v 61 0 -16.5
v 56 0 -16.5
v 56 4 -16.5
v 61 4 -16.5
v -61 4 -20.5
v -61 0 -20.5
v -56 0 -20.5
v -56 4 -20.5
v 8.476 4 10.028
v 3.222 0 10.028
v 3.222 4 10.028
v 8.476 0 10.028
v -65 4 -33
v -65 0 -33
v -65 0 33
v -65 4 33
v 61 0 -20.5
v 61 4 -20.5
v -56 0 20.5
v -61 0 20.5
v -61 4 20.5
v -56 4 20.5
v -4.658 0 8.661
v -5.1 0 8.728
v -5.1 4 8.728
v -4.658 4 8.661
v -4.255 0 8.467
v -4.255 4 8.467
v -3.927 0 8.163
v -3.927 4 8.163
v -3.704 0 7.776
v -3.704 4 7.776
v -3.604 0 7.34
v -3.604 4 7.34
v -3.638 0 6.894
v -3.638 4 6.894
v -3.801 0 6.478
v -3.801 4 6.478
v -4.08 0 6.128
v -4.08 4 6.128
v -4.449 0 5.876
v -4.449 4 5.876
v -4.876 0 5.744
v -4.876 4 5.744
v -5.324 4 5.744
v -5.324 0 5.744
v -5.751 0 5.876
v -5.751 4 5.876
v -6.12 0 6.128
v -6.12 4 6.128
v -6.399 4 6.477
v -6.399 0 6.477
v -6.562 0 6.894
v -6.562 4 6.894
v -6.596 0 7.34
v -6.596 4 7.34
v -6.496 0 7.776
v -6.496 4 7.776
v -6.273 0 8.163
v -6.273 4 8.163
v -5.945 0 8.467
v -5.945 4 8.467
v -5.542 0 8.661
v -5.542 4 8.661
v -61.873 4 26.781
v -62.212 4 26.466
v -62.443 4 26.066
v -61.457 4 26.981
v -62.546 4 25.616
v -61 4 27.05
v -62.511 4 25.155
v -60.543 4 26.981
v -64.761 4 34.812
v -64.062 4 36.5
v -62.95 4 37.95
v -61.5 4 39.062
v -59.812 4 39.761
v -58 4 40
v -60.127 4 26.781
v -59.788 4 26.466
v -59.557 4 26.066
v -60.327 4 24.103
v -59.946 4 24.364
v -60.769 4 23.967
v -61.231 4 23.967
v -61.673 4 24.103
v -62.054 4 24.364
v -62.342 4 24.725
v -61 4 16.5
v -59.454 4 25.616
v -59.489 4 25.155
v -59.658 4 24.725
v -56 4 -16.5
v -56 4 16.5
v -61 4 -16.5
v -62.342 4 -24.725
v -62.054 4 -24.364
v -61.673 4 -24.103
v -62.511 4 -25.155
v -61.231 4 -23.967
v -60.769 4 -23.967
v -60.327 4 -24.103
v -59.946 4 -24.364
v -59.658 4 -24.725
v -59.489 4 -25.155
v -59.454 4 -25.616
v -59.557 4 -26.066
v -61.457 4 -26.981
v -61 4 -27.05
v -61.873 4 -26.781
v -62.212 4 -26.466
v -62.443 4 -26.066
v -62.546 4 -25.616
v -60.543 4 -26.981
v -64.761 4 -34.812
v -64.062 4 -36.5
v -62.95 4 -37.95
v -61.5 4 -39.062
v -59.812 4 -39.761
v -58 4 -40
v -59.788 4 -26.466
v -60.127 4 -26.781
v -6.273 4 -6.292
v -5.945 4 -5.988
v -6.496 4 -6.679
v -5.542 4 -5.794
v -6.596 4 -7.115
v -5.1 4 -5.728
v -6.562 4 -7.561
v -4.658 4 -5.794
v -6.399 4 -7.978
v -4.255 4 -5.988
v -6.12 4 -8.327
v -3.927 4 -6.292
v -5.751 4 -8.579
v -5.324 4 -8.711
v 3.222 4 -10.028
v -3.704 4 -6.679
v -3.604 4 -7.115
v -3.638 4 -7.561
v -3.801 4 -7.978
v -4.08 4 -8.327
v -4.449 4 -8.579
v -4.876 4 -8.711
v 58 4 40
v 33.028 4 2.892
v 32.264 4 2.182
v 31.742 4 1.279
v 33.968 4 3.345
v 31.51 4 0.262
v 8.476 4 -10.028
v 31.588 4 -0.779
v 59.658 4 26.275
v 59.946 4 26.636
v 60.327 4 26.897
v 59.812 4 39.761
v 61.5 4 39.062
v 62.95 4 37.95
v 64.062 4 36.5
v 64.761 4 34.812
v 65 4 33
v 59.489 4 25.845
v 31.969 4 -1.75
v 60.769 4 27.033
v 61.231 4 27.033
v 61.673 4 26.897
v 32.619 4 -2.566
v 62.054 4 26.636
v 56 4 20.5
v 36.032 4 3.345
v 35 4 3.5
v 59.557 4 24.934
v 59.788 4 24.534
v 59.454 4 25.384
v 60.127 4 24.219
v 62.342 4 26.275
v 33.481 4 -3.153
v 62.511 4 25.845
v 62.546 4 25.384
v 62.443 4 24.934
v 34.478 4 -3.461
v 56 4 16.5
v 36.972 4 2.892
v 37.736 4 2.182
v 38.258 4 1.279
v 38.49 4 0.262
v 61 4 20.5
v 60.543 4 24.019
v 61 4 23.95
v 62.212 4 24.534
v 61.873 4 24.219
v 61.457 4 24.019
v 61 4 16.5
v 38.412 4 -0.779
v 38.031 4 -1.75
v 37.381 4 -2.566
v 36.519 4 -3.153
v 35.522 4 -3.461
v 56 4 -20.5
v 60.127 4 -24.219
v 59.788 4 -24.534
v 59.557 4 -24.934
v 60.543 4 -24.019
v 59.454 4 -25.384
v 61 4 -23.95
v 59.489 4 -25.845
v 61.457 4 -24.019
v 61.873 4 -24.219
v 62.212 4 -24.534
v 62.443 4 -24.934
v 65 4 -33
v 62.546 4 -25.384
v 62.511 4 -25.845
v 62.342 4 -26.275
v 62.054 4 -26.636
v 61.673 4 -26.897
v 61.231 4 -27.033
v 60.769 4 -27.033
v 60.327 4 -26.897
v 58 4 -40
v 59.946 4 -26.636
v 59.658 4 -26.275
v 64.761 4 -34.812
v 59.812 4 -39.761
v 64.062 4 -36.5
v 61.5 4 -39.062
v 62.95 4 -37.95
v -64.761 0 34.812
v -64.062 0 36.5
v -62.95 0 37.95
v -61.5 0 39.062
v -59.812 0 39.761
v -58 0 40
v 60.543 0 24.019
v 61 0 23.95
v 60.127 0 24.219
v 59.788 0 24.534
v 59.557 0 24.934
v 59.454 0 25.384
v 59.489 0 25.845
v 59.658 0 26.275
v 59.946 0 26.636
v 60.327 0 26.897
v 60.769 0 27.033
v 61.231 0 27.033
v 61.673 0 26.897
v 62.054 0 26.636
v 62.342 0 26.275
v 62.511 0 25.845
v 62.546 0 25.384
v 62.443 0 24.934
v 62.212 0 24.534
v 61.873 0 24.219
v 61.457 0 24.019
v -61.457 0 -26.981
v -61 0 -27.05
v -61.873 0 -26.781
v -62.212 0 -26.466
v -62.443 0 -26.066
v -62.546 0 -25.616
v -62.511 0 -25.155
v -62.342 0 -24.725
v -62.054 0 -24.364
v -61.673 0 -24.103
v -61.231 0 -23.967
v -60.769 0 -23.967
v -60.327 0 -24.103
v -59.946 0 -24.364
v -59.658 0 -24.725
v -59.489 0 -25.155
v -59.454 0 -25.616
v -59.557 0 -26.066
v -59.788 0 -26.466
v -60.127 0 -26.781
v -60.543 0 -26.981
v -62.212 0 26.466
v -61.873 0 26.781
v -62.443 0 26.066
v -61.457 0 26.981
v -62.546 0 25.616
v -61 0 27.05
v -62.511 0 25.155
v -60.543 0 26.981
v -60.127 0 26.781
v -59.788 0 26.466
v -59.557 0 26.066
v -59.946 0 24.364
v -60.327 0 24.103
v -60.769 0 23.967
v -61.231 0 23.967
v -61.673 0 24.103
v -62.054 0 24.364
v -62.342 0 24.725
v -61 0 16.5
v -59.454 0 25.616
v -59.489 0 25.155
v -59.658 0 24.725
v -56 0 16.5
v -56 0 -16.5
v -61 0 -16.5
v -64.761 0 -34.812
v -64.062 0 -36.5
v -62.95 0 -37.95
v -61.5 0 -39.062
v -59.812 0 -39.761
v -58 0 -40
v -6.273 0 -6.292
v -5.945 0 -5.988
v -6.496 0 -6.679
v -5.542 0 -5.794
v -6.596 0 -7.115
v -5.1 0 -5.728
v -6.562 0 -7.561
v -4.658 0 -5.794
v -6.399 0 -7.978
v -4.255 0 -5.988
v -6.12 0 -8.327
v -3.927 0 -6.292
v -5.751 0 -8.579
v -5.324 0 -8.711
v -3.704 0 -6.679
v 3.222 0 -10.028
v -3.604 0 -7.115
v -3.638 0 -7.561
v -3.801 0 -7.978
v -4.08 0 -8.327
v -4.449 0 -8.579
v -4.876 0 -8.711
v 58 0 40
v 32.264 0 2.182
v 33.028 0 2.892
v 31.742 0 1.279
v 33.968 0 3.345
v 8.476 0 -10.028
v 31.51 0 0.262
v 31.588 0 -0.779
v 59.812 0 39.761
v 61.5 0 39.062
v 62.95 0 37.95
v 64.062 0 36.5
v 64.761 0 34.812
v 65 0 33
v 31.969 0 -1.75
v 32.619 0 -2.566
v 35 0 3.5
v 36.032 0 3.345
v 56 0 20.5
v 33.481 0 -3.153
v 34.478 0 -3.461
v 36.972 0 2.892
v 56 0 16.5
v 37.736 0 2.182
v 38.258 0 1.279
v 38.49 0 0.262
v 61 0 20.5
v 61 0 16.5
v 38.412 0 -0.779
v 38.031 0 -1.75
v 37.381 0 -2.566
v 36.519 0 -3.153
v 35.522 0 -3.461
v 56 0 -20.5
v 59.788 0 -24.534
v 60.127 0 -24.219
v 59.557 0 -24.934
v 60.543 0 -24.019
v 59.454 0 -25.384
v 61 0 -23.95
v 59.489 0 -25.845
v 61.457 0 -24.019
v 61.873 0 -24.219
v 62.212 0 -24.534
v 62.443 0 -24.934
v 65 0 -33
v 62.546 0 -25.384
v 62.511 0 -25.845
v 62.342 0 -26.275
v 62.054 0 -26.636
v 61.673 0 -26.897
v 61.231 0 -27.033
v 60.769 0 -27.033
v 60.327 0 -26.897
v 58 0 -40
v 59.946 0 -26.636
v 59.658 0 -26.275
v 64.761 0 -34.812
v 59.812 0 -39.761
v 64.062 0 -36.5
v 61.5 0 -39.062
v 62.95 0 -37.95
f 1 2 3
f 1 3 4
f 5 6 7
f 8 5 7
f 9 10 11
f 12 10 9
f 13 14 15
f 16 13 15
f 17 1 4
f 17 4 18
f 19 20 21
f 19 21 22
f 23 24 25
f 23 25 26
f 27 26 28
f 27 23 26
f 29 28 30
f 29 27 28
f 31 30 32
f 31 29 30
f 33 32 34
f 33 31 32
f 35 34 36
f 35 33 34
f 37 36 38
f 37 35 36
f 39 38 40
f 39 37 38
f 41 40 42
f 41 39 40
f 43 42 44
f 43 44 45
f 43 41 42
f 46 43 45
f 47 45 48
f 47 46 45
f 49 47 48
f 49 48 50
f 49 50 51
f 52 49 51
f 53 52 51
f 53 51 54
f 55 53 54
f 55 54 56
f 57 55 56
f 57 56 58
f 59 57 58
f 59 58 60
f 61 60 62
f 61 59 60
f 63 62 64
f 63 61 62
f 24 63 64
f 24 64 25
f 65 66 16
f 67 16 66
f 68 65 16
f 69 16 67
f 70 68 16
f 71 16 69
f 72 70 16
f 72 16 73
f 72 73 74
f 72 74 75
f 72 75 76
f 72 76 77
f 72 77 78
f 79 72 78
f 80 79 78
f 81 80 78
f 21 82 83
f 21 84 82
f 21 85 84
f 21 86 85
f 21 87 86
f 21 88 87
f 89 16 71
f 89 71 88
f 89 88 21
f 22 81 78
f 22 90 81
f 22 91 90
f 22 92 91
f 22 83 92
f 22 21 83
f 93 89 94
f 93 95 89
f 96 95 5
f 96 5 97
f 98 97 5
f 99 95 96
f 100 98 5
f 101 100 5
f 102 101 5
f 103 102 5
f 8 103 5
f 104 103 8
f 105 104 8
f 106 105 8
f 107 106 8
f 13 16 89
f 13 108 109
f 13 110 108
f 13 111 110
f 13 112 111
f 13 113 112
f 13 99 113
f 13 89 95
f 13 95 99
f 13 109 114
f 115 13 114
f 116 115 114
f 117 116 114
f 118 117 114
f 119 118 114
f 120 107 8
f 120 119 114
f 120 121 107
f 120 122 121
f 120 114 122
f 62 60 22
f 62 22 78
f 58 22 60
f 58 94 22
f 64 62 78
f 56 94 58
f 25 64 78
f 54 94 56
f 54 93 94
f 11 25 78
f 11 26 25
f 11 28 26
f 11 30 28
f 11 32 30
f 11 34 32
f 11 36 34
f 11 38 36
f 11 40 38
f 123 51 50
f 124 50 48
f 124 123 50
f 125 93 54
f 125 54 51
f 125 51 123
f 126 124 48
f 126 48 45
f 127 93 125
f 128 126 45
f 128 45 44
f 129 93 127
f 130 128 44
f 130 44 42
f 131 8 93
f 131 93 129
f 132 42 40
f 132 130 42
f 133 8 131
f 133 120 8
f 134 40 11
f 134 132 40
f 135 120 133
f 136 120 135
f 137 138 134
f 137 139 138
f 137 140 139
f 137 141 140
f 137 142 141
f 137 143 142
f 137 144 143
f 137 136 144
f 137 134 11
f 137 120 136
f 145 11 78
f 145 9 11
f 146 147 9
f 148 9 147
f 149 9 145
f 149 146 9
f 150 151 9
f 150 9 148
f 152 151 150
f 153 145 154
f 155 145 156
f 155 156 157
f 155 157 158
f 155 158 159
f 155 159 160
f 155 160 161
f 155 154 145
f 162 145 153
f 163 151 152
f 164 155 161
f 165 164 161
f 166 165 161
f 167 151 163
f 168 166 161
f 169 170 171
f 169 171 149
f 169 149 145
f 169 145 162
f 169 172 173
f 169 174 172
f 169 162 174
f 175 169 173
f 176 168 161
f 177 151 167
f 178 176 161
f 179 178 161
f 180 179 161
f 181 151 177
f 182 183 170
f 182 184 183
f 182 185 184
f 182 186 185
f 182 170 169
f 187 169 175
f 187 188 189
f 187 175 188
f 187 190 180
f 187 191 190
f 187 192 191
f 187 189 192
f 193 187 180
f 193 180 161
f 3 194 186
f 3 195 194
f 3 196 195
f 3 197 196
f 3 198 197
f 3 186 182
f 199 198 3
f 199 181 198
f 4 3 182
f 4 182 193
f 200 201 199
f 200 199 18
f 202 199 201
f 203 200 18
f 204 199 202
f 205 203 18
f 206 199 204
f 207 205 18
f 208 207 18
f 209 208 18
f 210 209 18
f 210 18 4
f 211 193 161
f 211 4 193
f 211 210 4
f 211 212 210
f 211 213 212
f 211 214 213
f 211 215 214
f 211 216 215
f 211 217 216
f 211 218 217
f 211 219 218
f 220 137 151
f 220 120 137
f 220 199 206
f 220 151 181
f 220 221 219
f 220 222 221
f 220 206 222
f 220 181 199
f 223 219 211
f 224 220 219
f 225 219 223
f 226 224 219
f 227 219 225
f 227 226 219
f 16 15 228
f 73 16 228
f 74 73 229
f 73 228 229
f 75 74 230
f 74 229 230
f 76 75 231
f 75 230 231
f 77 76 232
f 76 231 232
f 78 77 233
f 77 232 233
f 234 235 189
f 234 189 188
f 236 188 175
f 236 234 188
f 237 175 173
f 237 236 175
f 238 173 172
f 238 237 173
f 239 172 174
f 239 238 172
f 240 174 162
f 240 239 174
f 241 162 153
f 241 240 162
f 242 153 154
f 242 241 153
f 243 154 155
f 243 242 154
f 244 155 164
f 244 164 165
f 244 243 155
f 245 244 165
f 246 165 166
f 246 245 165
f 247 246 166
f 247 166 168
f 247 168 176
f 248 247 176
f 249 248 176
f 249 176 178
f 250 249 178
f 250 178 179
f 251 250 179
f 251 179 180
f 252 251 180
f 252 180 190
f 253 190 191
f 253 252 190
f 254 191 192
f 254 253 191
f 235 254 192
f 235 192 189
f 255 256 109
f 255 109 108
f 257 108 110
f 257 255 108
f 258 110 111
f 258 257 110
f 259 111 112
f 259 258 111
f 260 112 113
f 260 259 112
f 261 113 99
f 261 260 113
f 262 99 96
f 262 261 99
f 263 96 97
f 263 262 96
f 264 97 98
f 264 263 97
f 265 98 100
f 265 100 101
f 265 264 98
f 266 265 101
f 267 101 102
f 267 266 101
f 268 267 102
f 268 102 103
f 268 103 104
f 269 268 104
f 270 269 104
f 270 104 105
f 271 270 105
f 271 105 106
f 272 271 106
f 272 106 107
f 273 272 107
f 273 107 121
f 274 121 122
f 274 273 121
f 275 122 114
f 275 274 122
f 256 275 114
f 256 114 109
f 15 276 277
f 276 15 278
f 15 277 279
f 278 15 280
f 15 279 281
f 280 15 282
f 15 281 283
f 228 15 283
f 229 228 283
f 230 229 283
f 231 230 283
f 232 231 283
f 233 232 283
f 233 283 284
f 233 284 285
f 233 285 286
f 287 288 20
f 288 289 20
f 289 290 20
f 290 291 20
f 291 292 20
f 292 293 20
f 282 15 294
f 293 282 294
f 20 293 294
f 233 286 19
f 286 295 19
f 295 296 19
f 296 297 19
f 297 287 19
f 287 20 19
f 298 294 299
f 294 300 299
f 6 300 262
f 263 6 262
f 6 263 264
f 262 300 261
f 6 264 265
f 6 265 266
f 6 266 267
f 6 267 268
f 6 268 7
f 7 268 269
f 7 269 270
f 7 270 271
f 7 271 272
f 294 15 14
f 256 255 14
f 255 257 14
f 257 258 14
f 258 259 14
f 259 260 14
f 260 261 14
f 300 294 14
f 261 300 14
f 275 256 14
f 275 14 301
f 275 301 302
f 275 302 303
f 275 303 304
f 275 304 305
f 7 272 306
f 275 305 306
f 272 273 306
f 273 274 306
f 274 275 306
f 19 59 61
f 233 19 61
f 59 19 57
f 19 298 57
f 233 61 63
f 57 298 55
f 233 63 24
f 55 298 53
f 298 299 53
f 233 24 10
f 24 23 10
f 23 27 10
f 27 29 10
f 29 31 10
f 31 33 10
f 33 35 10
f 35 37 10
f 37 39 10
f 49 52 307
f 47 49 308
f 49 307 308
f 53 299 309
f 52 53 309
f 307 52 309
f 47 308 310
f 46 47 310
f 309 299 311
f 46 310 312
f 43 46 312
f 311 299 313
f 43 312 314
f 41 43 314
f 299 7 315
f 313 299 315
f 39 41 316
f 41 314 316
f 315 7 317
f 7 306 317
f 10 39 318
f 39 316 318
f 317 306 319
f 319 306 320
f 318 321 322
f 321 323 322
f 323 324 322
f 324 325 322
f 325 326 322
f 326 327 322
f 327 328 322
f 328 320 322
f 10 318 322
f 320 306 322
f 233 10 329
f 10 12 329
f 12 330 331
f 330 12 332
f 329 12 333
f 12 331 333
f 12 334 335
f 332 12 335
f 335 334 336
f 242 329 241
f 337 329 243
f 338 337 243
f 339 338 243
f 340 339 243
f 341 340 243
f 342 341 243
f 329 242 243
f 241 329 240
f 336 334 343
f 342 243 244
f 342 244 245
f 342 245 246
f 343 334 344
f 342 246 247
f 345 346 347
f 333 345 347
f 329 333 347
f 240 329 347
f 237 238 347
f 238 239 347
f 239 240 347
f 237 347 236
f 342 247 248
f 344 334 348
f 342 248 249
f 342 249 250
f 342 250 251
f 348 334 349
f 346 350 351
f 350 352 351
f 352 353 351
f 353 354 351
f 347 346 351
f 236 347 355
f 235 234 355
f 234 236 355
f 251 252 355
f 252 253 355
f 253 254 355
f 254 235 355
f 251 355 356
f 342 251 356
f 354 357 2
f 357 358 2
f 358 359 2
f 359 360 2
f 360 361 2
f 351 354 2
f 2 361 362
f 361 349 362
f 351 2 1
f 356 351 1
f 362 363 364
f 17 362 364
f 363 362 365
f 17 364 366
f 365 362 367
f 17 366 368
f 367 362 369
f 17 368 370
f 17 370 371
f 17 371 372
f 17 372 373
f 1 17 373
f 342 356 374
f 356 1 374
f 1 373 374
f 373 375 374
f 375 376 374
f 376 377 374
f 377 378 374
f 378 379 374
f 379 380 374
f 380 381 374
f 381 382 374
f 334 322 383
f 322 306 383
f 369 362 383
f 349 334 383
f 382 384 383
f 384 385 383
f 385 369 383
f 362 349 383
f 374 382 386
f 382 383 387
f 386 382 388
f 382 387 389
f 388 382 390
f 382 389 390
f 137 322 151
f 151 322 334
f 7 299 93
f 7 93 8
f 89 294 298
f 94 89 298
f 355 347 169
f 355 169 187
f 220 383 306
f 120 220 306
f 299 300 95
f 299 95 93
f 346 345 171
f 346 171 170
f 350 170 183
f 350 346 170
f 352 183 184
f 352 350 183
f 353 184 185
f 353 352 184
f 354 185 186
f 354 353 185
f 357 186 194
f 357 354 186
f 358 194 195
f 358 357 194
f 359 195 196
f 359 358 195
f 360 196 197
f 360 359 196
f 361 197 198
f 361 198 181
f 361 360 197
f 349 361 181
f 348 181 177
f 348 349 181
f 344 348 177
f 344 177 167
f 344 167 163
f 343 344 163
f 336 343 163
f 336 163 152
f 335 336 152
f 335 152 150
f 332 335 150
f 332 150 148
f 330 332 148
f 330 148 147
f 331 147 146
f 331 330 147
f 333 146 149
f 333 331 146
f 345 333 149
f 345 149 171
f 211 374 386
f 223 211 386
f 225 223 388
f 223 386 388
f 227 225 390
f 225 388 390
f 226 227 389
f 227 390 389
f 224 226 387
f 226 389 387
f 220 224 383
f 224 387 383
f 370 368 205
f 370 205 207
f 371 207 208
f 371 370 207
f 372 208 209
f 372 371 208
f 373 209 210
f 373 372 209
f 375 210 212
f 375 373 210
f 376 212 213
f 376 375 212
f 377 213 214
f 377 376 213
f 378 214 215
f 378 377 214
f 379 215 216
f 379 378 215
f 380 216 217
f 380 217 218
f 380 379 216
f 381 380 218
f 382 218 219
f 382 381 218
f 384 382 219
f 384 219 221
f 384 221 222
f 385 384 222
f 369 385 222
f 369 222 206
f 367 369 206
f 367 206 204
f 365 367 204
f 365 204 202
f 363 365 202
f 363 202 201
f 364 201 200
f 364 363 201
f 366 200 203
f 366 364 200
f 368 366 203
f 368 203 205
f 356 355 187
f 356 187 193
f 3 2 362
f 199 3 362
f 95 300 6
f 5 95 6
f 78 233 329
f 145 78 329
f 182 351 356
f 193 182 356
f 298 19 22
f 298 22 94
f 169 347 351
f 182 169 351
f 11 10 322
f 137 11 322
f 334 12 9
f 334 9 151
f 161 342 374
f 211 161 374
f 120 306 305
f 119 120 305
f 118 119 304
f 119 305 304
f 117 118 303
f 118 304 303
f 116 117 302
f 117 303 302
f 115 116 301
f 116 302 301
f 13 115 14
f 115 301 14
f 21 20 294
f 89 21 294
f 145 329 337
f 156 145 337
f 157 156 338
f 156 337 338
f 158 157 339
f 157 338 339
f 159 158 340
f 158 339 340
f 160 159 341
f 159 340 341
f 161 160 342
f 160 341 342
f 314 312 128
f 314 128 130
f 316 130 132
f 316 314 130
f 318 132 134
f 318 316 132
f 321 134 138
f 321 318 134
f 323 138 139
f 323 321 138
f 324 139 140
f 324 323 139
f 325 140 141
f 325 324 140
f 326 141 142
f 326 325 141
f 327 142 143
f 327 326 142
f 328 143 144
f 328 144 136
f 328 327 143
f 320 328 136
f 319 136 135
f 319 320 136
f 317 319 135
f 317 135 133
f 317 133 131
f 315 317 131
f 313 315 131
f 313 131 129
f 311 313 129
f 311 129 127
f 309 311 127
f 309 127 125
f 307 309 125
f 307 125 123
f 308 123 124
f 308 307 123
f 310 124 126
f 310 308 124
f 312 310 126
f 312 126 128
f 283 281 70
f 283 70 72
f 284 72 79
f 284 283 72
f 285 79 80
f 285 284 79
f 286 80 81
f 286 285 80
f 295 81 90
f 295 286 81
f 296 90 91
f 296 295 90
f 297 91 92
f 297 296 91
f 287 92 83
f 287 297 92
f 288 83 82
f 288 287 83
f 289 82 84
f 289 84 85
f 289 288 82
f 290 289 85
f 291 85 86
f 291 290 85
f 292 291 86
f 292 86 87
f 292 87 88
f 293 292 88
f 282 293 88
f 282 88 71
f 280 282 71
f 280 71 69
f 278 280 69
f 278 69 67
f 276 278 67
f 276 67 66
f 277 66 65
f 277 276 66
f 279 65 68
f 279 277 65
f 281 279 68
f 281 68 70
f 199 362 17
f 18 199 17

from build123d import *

# Parameters (mm, degrees)
SKETCH1_R           = 1.55
SKETCH1_R_2         = 1.5
SKETCH1_R_3         = 3.5
SKETCH1_W           = 5
SKETCH1_H           = 4
SKETCH1_W_2         = 5.253269852
SKETCH1_H_2         = 20.055
BOSS_EXTRUDE1_DEPTH = 4


with BuildPart() as part:
    # Sketch1 → Boss-Extrude1 (new body)
    with BuildSketch(Plane(origin=(0, 0, 0), x_dir=(1, 0, 0), z_dir=(0, 1, 0))):
        with BuildLine():
            Line((-58, -40), (58, -40))
            ThreePointArc((58, -40), (62.949747468, -37.949747468), (65, -33))
            Line((65, -33), (65, 33))
            ThreePointArc((65, 33), (62.949747468, 37.949747468), (58, 40))
            Line((58, 40), (-58, 40))
            ThreePointArc((-58, 40), (-62.949747468, 37.949747468), (-65, 33))
            Line((-65, 33), (-65, -33))
            ThreePointArc((-65, -33), (-62.949747468, -37.949747468), (-58, -40))
        make_face()
        with Locations(Location((61, 25.5, 0), (0, 0, 270))):
            Circle(SKETCH1_R, mode=Mode.SUBTRACT)
        with Locations(Location((61, -25.5, 0), (0, 0, 90))):
            Circle(SKETCH1_R, mode=Mode.SUBTRACT)
        with Locations(Location((-61, -25.5, 0), (0, 0, 270))):
            Circle(SKETCH1_R, mode=Mode.SUBTRACT)
        with Locations(Location((-61, 25.5, 0), (0, 0, 90))):
            Circle(SKETCH1_R, mode=Mode.SUBTRACT)
        with Locations(Location((-5.1, -7.2275, 0), (0, 0, 270))):
            Circle(SKETCH1_R_2, mode=Mode.SUBTRACT)
        with Locations(Location((-5.1, 7.2275, 0), (0, 0, 270))):
            Circle(SKETCH1_R_2, mode=Mode.SUBTRACT)
        with Locations(Location((35, 0, 0), (0, 0, 270))):
            Circle(SKETCH1_R_3, mode=Mode.SUBTRACT)
        with Locations((58.5, 18.5)):
            Rectangle(SKETCH1_W, SKETCH1_H, mode=Mode.SUBTRACT)
        with Locations((58.5, -18.5)):
            Rectangle(SKETCH1_W, SKETCH1_H, mode=Mode.SUBTRACT)
        with Locations((-58.5, -18.5)):
            Rectangle(SKETCH1_W, SKETCH1_H, mode=Mode.SUBTRACT)
        with Locations((-58.5, 18.5)):
            Rectangle(SKETCH1_W, SKETCH1_H, mode=Mode.SUBTRACT)
        with Locations((5.848955237, 0)):
            Rectangle(SKETCH1_W_2, SKETCH1_H_2, mode=Mode.SUBTRACT)
    extrude(amount=BOSS_EXTRUDE1_DEPTH)


solid = part.part
